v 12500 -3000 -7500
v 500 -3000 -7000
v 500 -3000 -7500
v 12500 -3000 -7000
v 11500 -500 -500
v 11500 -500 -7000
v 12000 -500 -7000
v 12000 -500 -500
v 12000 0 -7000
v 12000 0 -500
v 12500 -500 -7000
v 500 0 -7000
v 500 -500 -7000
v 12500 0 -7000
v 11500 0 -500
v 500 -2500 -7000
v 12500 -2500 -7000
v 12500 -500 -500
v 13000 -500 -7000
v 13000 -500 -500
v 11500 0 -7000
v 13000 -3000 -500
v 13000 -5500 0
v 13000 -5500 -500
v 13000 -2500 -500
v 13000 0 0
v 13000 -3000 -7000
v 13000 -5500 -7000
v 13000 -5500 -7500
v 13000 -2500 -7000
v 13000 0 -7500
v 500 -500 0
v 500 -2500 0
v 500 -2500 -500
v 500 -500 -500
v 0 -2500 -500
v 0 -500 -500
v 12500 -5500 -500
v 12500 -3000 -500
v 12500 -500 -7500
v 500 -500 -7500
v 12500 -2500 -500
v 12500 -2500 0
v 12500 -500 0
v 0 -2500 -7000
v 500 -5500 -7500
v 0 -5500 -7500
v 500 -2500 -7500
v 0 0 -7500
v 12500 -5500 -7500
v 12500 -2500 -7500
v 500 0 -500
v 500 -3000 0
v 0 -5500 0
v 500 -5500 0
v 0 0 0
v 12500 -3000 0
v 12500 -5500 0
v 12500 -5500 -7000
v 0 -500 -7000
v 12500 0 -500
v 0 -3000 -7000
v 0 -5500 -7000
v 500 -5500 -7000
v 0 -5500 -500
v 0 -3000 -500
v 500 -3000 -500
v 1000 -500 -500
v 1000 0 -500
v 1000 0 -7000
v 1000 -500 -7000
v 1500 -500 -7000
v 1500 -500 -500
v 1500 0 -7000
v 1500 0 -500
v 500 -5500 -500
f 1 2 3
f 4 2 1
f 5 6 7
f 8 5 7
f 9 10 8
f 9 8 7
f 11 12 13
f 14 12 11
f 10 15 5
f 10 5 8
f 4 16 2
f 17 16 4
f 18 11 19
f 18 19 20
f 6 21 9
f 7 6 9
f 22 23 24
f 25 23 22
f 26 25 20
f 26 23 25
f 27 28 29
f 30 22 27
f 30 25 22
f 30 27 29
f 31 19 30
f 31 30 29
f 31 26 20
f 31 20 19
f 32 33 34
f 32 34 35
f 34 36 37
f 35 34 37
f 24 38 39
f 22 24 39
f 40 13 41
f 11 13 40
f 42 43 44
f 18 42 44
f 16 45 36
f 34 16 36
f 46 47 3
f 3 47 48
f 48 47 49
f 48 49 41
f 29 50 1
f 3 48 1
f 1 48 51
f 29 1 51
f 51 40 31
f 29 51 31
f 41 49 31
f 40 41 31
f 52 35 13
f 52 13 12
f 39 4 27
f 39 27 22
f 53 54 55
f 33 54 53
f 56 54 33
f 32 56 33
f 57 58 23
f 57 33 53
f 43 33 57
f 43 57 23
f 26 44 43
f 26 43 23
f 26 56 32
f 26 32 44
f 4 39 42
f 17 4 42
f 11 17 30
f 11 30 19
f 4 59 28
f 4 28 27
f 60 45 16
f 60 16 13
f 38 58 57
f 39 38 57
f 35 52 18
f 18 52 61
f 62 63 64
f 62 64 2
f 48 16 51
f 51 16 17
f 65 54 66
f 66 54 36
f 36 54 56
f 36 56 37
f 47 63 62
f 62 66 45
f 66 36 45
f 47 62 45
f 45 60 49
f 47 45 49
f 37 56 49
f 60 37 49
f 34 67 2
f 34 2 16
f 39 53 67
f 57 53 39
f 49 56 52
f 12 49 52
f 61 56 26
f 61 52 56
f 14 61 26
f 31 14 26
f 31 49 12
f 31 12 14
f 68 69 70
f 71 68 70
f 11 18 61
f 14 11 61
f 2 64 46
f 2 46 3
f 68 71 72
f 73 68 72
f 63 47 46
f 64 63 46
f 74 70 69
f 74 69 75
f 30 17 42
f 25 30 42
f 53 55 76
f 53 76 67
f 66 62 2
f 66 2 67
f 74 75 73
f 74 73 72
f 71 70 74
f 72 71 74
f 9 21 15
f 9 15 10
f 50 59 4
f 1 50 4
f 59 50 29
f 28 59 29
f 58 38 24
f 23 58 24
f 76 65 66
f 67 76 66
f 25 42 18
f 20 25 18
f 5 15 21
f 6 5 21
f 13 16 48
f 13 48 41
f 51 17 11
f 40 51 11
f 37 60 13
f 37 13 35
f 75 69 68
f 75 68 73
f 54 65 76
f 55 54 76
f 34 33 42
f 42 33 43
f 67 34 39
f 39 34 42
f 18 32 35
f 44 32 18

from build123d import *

# Parameters (mm, degrees)
ESQUISSE1_W             = 13000
ESQUISSE1_H             = 7500
ESQUISSE1_W_2           = 12000
ESQUISSE1_H_2           = 6500
BOSS_EXTRU_1_DEPTH      = 5500
ESQUISSE2_W             = 12000
ESQUISSE2_H             = 2000
ESQUISSE2_H_2           = 2500
ENL_V_MAT_EXTRU_1_DEPTH = 15985.367363146
ESQUISSE3_W             = 6500
ESQUISSE3_H             = 2000
ESQUISSE3_H_2           = 2500
ENL_V_MAT_EXTRU_2_DEPTH = 15985.367363146
ESQUISSE4_W             = 500
ESQUISSE4_H             = 6500
BOSS_EXTRU_2_DEPTH      = 500
BOSS_EXTRU_2_2_DEPTH    = 500


with BuildPart() as part:
    # Esquisse1 → Boss.-Extru.1 (new body)
    with BuildSketch(Plane(origin=(0, 0, 0), x_dir=(1, 0, 0), z_dir=(0, 1, 0))):
        with Locations((6500, 3750)):
            Rectangle(ESQUISSE1_W, ESQUISSE1_H)
        with Locations((6500, 3750)):
            Rectangle(ESQUISSE1_W_2, ESQUISSE1_H_2, mode=Mode.SUBTRACT)
    extrude(amount=-BOSS_EXTRU_1_DEPTH)

    # Esquisse2 → Enlèv. mat.-Extru.1 (cut, through all)
    with BuildSketch(Plane.XY):
        with Locations((6500, -1500)):
            Rectangle(ESQUISSE2_W, ESQUISSE2_H)
        with Locations((6500, -4250)):
            Rectangle(ESQUISSE2_W, ESQUISSE2_H_2)
    extrude(amount=-ENL_V_MAT_EXTRU_1_DEPTH, mode=Mode.SUBTRACT)

    # Esquisse3 → Enlèv. mat.-Extru.2 (cut, through all)
    with BuildSketch(Plane.ZY):
        with Locations((-3750, -1500)):
            Rectangle(ESQUISSE3_W, ESQUISSE3_H)
        with Locations((-3750, -4250)):
            Rectangle(ESQUISSE3_W, ESQUISSE3_H_2)
    extrude(amount=-ENL_V_MAT_EXTRU_2_DEPTH, mode=Mode.SUBTRACT)


with BuildPart() as body_2:
    # Esquisse4 → Boss.-Extru.2 (new body)
    with BuildSketch(Plane(origin=(0, 0, 0), x_dir=(1, 0, 0), z_dir=(0, 1, 0))):
        with Locations((1250, 3750)):
            Rectangle(ESQUISSE4_W, ESQUISSE4_H)
    extrude(amount=-BOSS_EXTRU_2_DEPTH)


with BuildPart() as body_3:
    # Esquisse4 → Boss.-Extru.2 2 (new body)
    with BuildSketch(Plane(origin=(0, 0, 0), x_dir=(1, 0, 0), z_dir=(0, 1, 0))):
        with Locations((11750, 3750)):
            Rectangle(ESQUISSE4_W, ESQUISSE4_H)
    extrude(amount=-BOSS_EXTRU_2_2_DEPTH)


solid = Compound([part.part, body_2.part, body_3.part])
